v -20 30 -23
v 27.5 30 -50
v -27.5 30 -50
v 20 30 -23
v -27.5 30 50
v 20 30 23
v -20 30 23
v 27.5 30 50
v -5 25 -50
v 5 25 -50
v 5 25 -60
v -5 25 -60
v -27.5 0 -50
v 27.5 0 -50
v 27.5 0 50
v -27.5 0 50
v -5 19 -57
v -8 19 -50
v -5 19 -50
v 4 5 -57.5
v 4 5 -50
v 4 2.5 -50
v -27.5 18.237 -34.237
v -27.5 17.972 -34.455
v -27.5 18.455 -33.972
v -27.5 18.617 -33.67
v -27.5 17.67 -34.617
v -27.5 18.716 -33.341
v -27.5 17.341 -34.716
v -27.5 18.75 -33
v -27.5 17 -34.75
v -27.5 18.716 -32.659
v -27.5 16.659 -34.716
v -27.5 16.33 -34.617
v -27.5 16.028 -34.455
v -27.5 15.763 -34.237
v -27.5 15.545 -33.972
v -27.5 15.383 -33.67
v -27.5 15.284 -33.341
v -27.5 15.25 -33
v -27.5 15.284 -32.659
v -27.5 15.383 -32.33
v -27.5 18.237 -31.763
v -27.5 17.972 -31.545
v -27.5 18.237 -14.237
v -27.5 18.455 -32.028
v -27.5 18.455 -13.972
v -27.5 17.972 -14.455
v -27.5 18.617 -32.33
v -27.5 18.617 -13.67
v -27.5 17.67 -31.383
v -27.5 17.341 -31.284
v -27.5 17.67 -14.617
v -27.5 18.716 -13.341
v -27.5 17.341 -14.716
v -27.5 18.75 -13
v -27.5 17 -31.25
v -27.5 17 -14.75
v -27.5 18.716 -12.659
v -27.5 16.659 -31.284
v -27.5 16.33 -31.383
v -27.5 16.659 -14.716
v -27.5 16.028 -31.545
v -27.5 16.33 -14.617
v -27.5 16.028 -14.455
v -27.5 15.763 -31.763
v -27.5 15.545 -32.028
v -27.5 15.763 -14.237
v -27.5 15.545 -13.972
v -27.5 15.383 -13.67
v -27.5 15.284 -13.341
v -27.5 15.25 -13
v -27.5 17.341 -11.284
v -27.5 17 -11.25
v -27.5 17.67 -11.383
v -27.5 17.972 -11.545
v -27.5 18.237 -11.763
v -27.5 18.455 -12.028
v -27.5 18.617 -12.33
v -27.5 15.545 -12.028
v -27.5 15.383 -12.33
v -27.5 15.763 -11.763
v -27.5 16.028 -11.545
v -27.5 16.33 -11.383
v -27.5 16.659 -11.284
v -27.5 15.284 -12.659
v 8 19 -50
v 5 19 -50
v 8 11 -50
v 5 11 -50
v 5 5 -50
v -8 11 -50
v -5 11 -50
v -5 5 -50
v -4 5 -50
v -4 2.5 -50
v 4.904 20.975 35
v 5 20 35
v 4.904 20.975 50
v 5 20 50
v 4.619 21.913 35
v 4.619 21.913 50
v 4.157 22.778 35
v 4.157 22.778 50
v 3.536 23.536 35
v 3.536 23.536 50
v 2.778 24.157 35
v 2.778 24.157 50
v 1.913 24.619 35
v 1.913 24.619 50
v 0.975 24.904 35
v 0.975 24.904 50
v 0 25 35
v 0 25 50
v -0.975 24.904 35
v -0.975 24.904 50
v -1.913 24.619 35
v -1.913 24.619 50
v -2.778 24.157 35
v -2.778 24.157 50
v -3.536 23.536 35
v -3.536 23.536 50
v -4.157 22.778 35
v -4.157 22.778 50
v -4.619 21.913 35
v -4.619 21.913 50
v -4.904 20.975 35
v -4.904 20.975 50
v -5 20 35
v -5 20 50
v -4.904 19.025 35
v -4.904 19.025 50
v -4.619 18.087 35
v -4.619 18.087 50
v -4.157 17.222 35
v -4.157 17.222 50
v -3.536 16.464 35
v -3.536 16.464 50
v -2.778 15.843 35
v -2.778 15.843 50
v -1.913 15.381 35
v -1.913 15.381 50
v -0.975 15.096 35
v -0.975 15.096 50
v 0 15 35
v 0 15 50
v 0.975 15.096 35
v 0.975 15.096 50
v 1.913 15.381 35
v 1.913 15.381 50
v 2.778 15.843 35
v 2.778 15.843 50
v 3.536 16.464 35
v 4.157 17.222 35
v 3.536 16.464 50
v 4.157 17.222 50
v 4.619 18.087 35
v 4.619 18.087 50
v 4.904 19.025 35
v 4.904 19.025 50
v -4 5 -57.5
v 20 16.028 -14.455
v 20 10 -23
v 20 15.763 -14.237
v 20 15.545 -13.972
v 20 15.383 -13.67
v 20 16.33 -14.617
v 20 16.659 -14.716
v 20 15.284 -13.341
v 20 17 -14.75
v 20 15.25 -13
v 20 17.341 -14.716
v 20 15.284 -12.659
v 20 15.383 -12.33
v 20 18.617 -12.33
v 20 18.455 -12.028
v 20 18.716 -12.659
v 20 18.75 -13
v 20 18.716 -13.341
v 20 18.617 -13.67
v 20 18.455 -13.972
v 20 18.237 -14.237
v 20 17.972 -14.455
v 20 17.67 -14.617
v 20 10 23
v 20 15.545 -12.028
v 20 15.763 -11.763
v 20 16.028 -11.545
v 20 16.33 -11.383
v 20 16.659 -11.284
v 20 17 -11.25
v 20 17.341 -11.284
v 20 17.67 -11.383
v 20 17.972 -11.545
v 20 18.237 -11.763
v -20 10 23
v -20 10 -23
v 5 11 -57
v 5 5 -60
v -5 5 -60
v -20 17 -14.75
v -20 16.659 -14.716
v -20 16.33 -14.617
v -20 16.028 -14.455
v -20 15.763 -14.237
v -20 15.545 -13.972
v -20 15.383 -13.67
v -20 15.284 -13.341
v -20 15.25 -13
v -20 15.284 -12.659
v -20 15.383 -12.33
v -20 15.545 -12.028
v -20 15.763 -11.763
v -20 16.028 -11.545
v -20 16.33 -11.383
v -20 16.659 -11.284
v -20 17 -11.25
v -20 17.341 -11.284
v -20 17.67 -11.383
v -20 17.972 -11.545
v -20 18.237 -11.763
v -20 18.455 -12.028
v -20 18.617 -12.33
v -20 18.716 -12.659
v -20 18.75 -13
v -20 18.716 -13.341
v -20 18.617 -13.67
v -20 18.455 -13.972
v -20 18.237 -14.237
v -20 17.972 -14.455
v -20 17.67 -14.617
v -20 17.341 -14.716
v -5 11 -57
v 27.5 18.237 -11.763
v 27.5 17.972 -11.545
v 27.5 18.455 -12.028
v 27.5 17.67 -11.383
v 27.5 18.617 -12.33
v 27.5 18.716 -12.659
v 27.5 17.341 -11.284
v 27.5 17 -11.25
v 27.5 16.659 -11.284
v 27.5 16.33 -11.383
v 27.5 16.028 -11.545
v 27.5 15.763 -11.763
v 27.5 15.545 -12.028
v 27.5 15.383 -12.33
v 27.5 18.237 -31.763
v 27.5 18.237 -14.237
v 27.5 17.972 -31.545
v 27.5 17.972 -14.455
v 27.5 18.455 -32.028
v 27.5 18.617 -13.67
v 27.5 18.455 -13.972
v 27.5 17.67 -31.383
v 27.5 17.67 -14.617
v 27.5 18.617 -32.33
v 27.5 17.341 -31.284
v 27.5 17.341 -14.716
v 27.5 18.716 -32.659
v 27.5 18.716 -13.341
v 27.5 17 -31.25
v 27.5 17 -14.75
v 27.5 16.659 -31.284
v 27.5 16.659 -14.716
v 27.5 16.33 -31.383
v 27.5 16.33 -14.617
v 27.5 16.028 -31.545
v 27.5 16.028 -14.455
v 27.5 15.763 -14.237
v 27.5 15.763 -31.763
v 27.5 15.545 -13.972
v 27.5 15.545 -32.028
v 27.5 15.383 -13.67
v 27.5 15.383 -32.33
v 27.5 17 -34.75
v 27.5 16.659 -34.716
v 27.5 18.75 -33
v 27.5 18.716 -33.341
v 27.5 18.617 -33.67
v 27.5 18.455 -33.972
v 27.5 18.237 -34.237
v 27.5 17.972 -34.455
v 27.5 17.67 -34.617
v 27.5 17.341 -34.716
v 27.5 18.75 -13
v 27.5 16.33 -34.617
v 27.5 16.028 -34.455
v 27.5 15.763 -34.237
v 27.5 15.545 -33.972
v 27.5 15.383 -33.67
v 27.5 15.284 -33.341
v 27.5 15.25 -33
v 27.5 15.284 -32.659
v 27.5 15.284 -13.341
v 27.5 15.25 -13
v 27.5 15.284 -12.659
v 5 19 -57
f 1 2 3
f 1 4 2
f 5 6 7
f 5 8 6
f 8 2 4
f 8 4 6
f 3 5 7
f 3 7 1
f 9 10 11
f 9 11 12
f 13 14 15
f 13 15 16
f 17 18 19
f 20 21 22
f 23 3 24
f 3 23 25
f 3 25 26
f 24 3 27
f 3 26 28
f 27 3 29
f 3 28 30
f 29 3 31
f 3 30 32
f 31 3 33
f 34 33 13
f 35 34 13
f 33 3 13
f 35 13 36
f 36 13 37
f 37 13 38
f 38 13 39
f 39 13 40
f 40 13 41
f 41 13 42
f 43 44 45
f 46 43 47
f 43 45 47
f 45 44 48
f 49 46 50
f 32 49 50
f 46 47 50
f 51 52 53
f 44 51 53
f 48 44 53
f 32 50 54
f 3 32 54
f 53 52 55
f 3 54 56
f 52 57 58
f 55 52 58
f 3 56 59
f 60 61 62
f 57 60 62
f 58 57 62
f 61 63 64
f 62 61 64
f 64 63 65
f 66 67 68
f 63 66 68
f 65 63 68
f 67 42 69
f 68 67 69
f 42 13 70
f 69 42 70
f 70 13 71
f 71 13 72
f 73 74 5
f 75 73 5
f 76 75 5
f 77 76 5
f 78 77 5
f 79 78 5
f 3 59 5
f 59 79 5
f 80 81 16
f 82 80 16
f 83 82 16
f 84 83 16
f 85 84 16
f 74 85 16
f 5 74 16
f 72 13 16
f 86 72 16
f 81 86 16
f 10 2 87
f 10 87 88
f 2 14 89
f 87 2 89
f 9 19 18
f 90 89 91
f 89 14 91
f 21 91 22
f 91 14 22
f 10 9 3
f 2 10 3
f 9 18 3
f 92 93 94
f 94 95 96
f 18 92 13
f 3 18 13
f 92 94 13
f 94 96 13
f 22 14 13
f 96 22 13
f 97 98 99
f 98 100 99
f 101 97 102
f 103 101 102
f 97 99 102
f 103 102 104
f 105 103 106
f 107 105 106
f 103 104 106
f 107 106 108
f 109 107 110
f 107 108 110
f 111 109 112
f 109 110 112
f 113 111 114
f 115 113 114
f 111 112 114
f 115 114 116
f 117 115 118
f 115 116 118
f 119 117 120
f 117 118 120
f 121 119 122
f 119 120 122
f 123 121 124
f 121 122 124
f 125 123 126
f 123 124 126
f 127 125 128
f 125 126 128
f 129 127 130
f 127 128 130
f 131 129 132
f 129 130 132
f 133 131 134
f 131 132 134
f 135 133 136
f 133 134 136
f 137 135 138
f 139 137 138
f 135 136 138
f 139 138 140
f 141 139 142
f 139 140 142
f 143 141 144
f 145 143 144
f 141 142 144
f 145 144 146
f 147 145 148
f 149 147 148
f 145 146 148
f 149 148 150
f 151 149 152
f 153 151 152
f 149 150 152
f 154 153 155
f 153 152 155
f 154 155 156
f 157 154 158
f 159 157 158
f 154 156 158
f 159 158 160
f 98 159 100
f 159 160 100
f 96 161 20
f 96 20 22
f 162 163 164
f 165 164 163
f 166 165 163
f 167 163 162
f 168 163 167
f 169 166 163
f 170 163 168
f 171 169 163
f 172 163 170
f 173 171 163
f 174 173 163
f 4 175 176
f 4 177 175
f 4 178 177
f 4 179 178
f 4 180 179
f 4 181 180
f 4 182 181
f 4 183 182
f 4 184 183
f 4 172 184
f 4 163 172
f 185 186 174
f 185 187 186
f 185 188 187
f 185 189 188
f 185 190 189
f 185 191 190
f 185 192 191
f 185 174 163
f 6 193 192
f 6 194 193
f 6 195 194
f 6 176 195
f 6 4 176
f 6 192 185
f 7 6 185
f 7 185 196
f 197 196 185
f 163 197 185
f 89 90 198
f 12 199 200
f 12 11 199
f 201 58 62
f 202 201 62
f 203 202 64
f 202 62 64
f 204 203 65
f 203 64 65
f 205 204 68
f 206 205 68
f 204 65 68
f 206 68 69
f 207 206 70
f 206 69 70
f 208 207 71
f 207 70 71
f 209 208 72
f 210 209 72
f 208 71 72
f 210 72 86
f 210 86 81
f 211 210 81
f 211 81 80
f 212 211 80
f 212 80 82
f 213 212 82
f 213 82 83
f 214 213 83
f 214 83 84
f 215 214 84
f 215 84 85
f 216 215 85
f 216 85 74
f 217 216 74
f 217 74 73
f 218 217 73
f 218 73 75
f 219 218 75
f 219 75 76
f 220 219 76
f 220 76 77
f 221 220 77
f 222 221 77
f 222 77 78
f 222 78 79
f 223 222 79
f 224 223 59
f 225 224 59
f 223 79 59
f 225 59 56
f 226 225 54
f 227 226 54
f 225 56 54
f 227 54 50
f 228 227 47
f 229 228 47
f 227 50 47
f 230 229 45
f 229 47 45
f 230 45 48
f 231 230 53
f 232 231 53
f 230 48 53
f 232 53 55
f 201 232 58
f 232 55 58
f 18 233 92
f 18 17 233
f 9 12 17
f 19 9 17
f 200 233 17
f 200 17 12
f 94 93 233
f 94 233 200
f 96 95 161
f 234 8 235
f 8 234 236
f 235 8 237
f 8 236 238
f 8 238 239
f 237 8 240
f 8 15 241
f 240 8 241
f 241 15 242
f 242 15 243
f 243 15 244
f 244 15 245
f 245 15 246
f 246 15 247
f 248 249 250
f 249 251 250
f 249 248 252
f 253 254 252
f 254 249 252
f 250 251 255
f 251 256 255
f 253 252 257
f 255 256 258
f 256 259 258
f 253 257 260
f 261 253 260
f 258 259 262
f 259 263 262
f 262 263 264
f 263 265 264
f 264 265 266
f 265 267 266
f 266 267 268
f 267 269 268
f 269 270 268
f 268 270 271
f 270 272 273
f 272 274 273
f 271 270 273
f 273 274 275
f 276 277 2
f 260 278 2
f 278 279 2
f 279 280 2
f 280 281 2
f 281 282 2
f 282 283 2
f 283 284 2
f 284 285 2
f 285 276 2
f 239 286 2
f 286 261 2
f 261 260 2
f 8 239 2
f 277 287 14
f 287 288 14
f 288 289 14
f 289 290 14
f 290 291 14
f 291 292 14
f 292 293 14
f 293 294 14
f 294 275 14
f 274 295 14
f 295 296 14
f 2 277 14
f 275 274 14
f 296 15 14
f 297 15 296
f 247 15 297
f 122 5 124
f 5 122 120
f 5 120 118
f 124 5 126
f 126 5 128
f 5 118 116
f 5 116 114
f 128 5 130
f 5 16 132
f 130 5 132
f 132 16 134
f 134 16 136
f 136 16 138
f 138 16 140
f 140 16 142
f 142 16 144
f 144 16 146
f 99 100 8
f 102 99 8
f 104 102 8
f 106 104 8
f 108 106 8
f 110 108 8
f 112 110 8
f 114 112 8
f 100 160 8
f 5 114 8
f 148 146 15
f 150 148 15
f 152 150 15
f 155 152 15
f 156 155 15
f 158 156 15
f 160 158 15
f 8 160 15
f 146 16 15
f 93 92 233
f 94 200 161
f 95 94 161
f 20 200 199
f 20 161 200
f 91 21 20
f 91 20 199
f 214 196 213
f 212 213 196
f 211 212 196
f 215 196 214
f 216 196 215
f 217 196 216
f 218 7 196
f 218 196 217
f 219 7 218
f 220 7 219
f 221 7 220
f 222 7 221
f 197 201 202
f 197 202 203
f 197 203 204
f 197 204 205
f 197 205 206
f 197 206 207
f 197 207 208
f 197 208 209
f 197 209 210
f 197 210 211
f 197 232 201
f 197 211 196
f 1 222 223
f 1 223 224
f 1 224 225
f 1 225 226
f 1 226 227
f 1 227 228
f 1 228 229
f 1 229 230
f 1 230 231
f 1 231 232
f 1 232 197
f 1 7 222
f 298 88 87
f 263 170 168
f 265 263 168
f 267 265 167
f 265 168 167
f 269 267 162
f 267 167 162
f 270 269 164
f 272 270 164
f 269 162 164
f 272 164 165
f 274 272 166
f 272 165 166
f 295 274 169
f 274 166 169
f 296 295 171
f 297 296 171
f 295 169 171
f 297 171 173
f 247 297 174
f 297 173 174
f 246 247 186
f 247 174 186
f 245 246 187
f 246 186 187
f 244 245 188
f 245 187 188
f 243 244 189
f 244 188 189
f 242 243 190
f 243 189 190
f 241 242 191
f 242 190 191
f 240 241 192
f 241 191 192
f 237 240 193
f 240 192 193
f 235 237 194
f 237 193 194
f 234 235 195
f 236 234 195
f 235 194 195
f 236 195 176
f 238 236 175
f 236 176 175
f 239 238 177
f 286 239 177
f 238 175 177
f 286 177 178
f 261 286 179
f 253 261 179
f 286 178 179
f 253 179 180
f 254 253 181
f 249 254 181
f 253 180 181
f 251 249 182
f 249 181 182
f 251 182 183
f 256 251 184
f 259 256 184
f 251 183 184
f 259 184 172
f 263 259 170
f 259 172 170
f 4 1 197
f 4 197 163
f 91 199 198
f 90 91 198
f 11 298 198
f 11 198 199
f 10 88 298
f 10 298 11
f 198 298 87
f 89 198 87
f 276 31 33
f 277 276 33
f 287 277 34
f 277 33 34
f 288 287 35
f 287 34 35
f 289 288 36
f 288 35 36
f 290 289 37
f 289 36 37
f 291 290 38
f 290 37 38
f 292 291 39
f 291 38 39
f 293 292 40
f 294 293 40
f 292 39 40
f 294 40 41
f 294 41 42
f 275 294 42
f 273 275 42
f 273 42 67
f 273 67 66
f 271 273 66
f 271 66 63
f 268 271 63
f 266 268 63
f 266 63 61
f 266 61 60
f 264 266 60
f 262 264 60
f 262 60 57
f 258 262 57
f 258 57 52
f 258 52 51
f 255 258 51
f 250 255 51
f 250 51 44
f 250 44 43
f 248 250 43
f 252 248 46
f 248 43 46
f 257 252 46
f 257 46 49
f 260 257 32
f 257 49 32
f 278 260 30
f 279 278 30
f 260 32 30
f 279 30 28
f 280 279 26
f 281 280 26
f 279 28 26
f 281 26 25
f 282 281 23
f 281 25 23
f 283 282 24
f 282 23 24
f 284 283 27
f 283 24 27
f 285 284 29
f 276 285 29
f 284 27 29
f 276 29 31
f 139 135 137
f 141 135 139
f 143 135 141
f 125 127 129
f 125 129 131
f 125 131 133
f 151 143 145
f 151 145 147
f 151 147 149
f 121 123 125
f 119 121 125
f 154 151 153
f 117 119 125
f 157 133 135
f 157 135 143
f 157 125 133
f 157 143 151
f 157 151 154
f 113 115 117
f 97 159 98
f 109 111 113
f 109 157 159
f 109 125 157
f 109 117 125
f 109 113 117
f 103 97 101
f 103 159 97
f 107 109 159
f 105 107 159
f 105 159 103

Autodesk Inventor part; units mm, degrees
ref_plane "YZ Plane" through (0, 0, 0) normal (1, 0, 0) x (0, 1, 0)
sketch "Boceto1" plane through (0, 0, 0) normal (0, 1, 0) x (-1, 0, 0)
  line L0 (27.5, 50) -> (-27.5, 50)
  line L1 (-27.5, 50) -> (-27.5, -50)
  line L2 (-27.5, -50) -> (27.5, -50)
  line L3 (27.5, -50) -> (27.5, 50)
  line L4 (27.5, 50) -> (-27.5, -50) construction
  line L5 (-27.5, 50) -> (27.5, -50) construction
  point P0 (0, 0)
  dimension "d0" = 55
  dimension "d1" = 100
extrude "Extrusión1" add sketch "Boceto1" along normal blind 30
sketch "Boceto2" plane through (27.5, 0, -50) normal (0, 0, -1) x (-1, 0, 0)
  line L0 (22.5, 25) -> (32.5, 25)
  line L1 (32.5, 25) -> (32.5, 5)
  line L2 (32.5, 5) -> (22.5, 5)
  line L3 (22.5, 5) -> (22.5, 25)
  line L4 (22.5, 25) -> (32.5, 5) construction
  line L5 (32.5, 25) -> (22.5, 5) construction
  line L6 (0, 30) -> (55, 30) projected
  line L7 (0, 0) -> (0, 30) projected
  line L8 (55, 0) -> (55, 30) projected
  point P0 (27.5, 0)
  point P1 (27.5, 15)
  point P2 (27.5, 25)
  dimension "d4" = 10
  dimension "d5" = 20
  dimension "d6" = 5
  dimension "d7" = 22.5
  dimension "d24" = 22.5
extrude "Extrusión2" add sketch "Boceto2" along normal blind 10
sketch "Boceto3" plane through (-27.5, 0, 50) normal (0, 0, 1) x (1, 0, 0)
  circle A0 centre (27.5, 20) radius 5
  line L0 (0, 30) -> (55, 30) projected
  point P0 (27.5, 0)
  point P1 (27.5, 30)
  dimension "d10" = 10
  dimension "d11" = 10
extrude "Extrusión3" cut sketch "Boceto3" against normal blind 15
sketch "Boceto4" plane through (0, 30, 0) normal (0, 1, 0) x (1, 0, 0)
  line L0 (-20, 23) -> (20, 23)
  line L1 (20, 23) -> (20, -23)
  line L2 (20, -23) -> (-20, -23)
  line L3 (-20, -23) -> (-20, 23)
  line L4 (-20, 23) -> (20, -23) construction
  line L5 (20, 23) -> (-20, -23) construction
  point P0 (0, 0)
  dimension "d14" = 40
  dimension "d15" = 46
extrude "Extrusión4" cut sketch "Boceto4" against normal blind 20
ref_plane "Plano de trabajo1" through (0, 5, -50) normal (1, 0, 0) x (0, 0, -1)
sketch "Boceto5" plane through (0, 5, -50) normal (1, 0, 0) x (0, 0, -1)
  line L0 (7.5, 0) -> (0, -2.5)
  line L1 (0, -2.5) -> (0, 0)
  line L2 (0, 0) -> (7.5, 0)
  point P0 (-50, -5)
  point P1 (0, -5)
  point P2 (10, 0)
  dimension "d25" = 2.5
  dimension "d26" = 2.5
extrude "Extrusión5" add sketch "Boceto5" along normal mid plane 8
ref_plane "Plano de trabajo2" through (0, 15, 0) normal (0, -1, 0) x (1, 0, 0)
sketch "Boceto6" plane through (0, 15, 0) normal (0, -1, 0) x (1, 0, 0)
  line L0 (5, -50) -> (8, -50)
  line L1 (27.5, -50) -> (-27.5, -50)
  line L2 (5, -57) -> (8, -50)
  line L3 (4, -50) -> (5, -50) projected
  line L4 (5, -50) -> (5, -57)
  line L5 (0, -50.2371) -> (0, -56.5746)
  line L6 (-5, -50) -> (-8, -50)
  line L7 (-27.5, -50) -> (27.5, -50)
  line L8 (-5, -57) -> (-8, -50)
  line L9 (-4, -50) -> (-5, -50)
  line L10 (-5, -50) -> (-5, -57)
  point P0 (0, 0)
  point P1 (5, -60)
  point P2 (-5, -60)
  dimension "d29" = 3
  dimension "d30" = 3
extrude "Extrusión6" add sketch "Boceto6" along normal mid plane 8
sketch "Boceto7" plane through (27.5, 0, 50) normal (1, 0, 0) x (0, 0, -1)
  point P0 (50, 0)
ref_plane "Plano de trabajo4" through (-20, 30, -23) normal (0, 0, 1) x (1, 0, 0)
sketch "Boceto8" plane through (27.5, 0, 50) normal (1, 0, 0) x (0, 0, -1)
  line L0 (58, 22) -> (88, 22)
  circle A0 centre (83, 17) radius 1.75
  line L1 (63, 17) -> (83, 17)
  line L2 (88, 22) -> (88, 12)
  circle A1 centre (63, 17) radius 1.75
  line L3 (58, 12) -> (88, 22) construction
  line L4 (58, 22) -> (88, 12) construction
  line L5 (58, 12) -> (58, 22)
  line L6 (88, 12) -> (58, 12)
  line L7 (73, 30) -> (73, 10) projected
  line L8 (0, 30) -> (100, 30) projected
  point P0 (50, 0)
  point P1 (72.9522, 12.5553)
  point P2 (57.9522, 14.5161)
  point P3 (72.9522, 12.5553)
  point P4 (88, 17)
  dimension "d34" = 10
  dimension "d35" = 30
  dimension "d36" = 5
  dimension "d37" = 5
  dimension "d38" = 5
  dimension "d39" = 5
  dimension "d40" = 10
  dimension "d41" = 8
hole "Agujero1" at (27.5, 17, -13) at (27.5, 17, -33) direction (-1, 0, 0) diameter 3.5 end through all
properties part number "camera_support_2"
